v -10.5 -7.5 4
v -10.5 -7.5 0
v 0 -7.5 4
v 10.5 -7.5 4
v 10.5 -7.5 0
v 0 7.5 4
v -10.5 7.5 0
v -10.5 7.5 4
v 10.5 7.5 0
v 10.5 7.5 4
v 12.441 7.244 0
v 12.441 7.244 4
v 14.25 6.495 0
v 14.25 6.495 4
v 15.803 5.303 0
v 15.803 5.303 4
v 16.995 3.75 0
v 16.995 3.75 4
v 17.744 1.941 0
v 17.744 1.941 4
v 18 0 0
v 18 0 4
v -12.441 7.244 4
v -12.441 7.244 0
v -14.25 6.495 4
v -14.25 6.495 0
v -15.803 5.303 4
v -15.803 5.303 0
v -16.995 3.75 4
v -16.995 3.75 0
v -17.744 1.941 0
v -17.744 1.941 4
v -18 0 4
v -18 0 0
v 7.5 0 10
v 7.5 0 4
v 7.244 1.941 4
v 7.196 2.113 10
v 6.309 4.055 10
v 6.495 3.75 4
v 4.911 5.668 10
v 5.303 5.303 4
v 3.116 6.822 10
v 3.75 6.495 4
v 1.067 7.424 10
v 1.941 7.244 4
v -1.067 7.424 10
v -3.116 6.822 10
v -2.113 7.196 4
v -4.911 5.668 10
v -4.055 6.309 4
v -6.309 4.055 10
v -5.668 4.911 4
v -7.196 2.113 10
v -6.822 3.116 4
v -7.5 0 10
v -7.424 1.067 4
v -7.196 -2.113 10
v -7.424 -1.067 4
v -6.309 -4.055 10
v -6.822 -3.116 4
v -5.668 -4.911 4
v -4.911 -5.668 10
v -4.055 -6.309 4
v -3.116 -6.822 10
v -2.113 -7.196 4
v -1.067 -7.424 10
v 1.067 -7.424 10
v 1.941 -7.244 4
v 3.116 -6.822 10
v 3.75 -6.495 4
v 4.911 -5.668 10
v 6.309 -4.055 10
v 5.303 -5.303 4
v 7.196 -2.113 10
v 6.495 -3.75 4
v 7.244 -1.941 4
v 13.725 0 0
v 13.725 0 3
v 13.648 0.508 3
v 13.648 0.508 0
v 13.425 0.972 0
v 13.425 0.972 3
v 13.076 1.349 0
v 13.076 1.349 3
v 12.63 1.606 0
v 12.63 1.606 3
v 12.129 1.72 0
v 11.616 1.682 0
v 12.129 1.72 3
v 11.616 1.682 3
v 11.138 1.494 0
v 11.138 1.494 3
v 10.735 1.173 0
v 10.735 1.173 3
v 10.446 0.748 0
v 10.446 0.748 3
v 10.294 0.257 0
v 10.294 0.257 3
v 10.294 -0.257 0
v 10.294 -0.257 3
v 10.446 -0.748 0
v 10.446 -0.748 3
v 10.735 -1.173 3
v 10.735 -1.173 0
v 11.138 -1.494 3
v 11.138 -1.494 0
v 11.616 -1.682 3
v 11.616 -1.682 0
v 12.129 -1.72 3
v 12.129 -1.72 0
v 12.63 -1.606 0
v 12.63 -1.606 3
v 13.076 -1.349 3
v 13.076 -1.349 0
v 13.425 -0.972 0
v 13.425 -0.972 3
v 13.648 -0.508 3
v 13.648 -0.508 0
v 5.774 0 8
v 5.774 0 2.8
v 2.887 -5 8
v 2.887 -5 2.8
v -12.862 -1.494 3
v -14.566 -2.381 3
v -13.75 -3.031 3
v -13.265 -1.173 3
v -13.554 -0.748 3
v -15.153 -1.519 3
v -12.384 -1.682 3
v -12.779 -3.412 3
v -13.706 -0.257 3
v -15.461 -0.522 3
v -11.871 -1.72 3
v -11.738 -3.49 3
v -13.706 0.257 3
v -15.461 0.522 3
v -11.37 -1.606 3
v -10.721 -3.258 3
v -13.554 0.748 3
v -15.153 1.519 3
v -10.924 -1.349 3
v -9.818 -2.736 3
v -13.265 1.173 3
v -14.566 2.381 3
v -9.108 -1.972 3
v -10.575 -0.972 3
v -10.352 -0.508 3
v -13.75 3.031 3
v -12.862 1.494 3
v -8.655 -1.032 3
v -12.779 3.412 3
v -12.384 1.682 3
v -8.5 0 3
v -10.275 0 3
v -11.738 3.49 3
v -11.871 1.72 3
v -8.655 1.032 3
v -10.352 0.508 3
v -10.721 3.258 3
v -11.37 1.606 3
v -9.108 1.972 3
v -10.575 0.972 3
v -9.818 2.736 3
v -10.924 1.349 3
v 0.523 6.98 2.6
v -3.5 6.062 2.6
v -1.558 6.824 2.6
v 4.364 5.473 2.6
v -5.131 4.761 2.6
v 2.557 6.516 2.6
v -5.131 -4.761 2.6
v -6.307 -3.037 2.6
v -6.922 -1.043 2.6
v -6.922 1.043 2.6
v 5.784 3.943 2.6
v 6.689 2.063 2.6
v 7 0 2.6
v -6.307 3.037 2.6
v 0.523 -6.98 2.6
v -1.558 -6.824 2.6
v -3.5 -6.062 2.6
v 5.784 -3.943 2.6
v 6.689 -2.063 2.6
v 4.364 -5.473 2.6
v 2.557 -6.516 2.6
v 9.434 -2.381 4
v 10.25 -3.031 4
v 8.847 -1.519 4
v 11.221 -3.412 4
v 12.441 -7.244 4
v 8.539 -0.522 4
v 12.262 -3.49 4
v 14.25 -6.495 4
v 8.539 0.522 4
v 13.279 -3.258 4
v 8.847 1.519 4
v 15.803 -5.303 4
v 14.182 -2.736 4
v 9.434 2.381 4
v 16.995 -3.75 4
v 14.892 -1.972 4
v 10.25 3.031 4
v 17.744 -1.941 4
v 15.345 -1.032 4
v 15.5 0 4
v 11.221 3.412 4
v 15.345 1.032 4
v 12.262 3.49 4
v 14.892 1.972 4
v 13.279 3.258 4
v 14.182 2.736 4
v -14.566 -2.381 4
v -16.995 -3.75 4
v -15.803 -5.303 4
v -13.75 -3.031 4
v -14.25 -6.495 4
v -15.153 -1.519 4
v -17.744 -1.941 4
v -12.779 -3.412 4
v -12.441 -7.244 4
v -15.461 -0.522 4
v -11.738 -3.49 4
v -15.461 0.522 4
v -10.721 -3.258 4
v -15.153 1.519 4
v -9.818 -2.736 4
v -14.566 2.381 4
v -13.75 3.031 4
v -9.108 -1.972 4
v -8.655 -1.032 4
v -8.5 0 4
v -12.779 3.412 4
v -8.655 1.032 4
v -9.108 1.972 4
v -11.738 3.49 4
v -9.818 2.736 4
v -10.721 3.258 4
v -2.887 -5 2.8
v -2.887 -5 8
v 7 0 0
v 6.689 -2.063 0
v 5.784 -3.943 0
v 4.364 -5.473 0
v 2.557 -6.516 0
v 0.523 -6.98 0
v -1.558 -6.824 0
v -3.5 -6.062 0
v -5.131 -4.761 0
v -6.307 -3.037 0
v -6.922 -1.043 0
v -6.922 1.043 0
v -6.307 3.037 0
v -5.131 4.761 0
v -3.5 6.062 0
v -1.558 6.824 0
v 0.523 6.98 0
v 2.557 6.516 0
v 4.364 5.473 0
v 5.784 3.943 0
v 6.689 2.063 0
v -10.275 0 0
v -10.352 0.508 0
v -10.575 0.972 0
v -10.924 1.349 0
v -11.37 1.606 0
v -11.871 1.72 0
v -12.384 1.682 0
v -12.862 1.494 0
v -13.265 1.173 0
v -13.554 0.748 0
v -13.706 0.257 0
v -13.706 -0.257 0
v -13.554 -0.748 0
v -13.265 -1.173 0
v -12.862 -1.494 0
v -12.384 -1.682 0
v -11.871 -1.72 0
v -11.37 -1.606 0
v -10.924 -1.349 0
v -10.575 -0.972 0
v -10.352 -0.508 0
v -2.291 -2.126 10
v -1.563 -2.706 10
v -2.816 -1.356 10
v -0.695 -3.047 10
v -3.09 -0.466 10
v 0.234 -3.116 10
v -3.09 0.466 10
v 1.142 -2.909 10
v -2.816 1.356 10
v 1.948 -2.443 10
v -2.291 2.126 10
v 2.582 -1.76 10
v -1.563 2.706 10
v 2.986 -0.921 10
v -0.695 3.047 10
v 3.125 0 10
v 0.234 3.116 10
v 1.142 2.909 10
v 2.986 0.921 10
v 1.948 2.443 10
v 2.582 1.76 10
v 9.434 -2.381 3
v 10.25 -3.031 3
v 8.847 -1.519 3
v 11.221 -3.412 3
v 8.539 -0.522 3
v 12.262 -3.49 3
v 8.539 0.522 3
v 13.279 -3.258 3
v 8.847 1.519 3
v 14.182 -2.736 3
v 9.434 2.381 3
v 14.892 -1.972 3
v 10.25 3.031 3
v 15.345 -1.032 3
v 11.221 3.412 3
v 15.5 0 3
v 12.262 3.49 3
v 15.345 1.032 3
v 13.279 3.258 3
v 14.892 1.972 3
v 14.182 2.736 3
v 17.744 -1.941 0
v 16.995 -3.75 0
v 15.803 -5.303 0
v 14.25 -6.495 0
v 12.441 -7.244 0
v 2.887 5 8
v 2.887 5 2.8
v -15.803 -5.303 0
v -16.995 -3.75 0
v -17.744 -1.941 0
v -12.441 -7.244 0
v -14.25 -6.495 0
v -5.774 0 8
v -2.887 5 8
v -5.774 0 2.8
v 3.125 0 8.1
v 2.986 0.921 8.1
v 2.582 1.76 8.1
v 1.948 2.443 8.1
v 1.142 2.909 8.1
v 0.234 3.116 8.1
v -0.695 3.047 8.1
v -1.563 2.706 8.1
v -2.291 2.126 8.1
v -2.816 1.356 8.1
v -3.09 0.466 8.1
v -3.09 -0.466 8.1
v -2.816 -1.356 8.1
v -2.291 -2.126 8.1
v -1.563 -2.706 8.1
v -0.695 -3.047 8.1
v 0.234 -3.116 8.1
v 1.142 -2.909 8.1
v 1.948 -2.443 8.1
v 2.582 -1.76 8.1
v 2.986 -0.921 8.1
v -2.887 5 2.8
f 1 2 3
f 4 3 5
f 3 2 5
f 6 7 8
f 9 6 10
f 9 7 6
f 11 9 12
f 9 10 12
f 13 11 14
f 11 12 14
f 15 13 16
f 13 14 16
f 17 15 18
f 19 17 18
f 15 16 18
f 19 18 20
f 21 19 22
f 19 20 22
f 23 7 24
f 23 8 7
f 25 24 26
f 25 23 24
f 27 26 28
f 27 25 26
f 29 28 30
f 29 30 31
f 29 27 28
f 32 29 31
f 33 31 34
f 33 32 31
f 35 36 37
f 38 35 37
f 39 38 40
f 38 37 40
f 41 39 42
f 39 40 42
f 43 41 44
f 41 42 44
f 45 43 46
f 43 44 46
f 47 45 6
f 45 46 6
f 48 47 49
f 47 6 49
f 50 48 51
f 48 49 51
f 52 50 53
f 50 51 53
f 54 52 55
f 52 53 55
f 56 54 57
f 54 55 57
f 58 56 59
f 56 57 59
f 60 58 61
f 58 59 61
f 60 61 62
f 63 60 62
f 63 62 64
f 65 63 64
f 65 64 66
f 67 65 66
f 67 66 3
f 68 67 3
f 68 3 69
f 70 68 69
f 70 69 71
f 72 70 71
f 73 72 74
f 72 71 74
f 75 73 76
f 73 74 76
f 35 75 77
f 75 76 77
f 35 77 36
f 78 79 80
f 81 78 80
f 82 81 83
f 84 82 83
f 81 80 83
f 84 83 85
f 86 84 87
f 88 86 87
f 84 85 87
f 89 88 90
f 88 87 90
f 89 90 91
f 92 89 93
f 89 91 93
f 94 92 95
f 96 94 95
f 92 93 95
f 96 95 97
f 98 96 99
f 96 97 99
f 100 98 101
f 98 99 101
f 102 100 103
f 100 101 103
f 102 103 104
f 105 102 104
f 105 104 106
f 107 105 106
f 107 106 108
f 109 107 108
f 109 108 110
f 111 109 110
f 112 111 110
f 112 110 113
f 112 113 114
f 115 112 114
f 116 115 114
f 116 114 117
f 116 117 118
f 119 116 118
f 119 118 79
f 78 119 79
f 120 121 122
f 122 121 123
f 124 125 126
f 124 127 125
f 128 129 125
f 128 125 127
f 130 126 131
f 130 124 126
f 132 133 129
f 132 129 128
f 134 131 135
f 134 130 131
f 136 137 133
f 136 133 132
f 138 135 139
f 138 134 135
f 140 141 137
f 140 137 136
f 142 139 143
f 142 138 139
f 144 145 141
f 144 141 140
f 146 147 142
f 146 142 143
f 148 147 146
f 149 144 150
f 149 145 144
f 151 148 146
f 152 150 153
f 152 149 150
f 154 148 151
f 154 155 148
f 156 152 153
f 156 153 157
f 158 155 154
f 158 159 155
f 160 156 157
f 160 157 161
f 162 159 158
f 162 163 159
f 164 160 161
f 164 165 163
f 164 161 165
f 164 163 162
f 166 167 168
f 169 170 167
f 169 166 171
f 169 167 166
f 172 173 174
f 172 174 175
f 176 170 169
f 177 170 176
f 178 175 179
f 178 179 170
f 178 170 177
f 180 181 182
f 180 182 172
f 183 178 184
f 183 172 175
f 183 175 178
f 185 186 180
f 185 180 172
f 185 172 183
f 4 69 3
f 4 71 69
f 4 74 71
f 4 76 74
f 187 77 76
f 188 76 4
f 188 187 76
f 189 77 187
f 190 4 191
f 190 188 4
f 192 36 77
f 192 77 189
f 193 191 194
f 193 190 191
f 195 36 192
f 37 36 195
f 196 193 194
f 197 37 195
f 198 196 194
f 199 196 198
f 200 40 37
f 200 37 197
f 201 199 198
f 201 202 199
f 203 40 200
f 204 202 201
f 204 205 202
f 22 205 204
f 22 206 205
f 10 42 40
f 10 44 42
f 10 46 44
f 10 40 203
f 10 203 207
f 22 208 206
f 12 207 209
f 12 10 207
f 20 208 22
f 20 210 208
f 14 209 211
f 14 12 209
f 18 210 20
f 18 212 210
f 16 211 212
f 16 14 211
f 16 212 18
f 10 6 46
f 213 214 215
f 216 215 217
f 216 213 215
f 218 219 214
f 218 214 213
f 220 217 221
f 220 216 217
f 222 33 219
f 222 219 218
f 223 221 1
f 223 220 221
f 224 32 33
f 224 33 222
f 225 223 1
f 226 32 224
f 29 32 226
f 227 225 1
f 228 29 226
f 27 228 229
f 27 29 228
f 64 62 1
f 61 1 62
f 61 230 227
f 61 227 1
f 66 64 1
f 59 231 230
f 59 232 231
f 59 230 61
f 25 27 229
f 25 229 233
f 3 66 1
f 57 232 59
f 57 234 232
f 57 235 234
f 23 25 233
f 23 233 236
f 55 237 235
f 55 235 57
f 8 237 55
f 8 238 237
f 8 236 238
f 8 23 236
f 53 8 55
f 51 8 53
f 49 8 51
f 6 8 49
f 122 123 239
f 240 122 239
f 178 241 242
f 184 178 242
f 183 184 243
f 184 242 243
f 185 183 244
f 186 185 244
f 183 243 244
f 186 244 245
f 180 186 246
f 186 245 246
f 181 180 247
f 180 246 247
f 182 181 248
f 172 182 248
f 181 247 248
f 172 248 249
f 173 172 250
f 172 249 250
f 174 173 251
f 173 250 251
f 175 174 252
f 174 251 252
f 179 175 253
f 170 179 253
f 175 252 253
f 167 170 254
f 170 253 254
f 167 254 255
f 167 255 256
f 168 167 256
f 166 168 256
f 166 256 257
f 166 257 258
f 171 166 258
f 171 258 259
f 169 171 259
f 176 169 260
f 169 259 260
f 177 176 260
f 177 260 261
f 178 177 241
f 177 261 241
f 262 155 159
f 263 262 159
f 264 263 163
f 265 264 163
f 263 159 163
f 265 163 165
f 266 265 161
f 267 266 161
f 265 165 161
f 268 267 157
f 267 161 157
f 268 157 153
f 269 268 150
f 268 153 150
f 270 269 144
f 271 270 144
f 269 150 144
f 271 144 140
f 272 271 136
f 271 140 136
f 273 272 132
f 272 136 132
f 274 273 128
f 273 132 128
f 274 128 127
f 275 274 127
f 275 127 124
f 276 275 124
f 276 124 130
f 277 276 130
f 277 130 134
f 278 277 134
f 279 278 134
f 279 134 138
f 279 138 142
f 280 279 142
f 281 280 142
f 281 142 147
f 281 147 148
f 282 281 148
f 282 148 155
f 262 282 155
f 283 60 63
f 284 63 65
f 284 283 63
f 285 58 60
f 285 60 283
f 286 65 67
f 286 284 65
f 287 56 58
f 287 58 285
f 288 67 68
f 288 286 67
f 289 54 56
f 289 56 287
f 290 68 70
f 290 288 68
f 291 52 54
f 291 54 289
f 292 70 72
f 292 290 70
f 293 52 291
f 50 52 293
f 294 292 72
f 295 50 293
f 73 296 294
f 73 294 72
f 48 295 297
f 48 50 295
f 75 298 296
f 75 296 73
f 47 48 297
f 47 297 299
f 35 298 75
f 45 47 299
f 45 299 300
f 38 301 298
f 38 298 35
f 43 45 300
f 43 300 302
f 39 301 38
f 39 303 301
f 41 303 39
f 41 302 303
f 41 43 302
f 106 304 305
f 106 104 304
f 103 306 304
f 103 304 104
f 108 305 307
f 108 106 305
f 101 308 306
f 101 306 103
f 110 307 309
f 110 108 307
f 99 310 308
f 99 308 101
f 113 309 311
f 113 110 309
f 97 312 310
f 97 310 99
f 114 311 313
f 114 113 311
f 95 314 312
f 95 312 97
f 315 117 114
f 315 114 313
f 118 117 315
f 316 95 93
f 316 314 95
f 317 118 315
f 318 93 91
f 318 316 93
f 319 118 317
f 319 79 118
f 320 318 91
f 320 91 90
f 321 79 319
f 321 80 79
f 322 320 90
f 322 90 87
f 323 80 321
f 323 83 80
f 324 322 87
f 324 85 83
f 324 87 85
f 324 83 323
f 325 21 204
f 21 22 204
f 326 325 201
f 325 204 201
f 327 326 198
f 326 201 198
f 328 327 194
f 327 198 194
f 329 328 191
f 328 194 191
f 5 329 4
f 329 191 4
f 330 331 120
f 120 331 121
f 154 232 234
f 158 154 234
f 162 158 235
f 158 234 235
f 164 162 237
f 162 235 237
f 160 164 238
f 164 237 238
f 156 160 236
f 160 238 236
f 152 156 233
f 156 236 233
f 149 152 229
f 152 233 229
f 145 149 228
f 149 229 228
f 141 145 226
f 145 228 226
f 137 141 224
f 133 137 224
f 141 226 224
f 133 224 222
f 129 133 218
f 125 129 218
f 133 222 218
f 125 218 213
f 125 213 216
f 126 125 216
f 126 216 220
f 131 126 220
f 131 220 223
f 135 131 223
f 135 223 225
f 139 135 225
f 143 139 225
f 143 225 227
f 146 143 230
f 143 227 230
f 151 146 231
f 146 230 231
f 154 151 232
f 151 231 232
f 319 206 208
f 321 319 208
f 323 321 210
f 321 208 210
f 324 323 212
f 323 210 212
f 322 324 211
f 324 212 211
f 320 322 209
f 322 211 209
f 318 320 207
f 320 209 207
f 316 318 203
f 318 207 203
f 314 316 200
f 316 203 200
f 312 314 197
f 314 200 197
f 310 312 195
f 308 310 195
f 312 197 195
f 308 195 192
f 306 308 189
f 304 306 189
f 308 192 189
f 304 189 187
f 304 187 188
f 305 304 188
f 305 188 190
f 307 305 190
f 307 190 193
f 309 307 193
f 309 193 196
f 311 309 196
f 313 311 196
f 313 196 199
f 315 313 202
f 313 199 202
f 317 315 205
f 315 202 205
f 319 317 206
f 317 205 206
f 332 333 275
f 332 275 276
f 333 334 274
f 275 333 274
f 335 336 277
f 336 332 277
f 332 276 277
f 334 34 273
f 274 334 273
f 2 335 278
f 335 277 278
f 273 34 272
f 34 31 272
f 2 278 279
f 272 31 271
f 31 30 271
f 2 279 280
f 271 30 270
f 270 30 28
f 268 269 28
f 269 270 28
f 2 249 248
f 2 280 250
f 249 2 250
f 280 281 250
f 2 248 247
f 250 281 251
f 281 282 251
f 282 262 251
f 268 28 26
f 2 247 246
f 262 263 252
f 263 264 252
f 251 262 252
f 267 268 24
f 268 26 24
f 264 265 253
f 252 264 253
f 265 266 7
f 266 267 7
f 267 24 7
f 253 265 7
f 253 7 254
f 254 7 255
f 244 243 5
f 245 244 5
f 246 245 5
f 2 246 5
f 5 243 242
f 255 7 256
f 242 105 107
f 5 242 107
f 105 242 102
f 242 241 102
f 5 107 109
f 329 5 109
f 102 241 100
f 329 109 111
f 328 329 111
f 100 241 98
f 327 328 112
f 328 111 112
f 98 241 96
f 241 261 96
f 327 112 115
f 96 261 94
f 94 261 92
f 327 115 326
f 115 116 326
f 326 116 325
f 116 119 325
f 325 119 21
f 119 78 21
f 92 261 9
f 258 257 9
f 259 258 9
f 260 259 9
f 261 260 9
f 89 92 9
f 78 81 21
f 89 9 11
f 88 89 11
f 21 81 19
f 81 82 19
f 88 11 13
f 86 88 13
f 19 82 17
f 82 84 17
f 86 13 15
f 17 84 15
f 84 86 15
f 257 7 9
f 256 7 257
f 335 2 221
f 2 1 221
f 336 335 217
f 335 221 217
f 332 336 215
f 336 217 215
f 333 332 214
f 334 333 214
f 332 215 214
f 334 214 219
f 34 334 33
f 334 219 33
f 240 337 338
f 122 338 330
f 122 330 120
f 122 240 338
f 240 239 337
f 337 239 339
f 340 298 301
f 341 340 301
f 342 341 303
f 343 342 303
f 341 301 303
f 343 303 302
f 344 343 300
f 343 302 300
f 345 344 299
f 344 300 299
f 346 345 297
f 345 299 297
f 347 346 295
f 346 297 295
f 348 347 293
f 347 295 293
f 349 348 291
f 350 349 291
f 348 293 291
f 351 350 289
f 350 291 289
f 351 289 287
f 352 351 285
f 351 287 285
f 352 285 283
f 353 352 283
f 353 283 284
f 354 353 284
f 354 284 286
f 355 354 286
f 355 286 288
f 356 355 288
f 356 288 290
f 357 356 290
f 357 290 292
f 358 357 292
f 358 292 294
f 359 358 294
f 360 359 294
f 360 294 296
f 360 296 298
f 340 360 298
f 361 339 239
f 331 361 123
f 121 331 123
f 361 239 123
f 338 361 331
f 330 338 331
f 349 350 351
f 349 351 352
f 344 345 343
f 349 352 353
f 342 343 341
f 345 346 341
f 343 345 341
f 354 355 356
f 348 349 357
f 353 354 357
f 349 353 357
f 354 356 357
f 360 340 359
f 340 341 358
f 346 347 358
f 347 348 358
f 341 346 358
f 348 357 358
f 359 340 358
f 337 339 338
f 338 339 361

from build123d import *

# Parameters (mm, degrees)
F0_W      = 36
F0_H      = 15
F1_DEPTH  = 4
F2_R      = 7.5
F3_DEPTH  = 6
F4_R      = 7.49999
F6_DEPTH  = 8
F7_R      = 1.725
F8_DEPTH  = 4
F7_R_2    = 3.5
F9_DEPTH  = 1
F10_R     = 3.125
F11_DEPTH = 2
F12_R     = 3.2
F13_DEPTH = 0.1
F14_R     = 7
F15_DEPTH = 2.6
F17_DEPTH = 0.2


# Not quite as in the source:
# - a fillet or chamfer is up to 0.001 mm smaller than in the source, because OpenCascade refuses the exact size


with BuildPart() as f1:
    # F0 (on Top) → F1 (new body)
    with BuildSketch(Plane.XY):
        Rectangle(F0_W, F0_H)
    extrude(amount=F1_DEPTH)

    # F2 (on face) → F3 (join)
    with BuildSketch(Plane.XY.offset(4)):
        Circle(F2_R)
    extrude(amount=F3_DEPTH)

    # F4 (radius 7.5 in the source; OpenCascade refuses exactly that, so slightly less here)
    f4_edges = [f1.edges().sort_by_distance(p)[0] for p in [
        (-18, -7.5, 2),
        (-18, 7.5, 2),
        (18, -7.5, 2),
        (18, 7.5, 2),
    ]]
    fillet(f4_edges, radius=F4_R)

    # F5 (on face) → F6 (cut)
    with BuildSketch(Plane(origin=(0, 0, 0), x_dir=(1, 0, 0), z_dir=(0, 0, -1))):
        Polygon((2.8867513459, 5), (-2.8867513459, 5), (-5.7735026919, 0), (-2.8867513459, -5), (2.8867513459, -5), (5.7735026919, 0), align=None)
    extrude(amount=-F6_DEPTH, mode=Mode.SUBTRACT)

    # F7 (on face) → F8 (cut, through all)
    with BuildSketch(Plane.XY.offset(4)):
        with Locations((12, 0)):
            Circle(F7_R)
        with Locations((-12, 0)):
            Circle(F7_R)
    extrude(amount=-F8_DEPTH, mode=Mode.SUBTRACT)

    # F7 (on face) → F9 (cut)
    with BuildSketch(Plane.XY.offset(4)):
        with Locations((-12, 0)):
            Circle(F7_R_2)
        with Locations((-12, 0)):
            Circle(F7_R, mode=Mode.SUBTRACT)
        with Locations((12, 0)):
            Circle(F7_R_2)
        with Locations((12, 0)):
            Circle(F7_R, mode=Mode.SUBTRACT)
    extrude(amount=-F9_DEPTH, mode=Mode.SUBTRACT)

    # F10 (on face) → F11 (cut, through all)
    with BuildSketch(Plane.XY.offset(10)):
        Circle(F10_R)
    extrude(amount=-F11_DEPTH, mode=Mode.SUBTRACT)

    # F12 (on face) → F13 (join)
    with BuildSketch(Plane(origin=(0, 0, 8), x_dir=(1, 0, 0), z_dir=(0, 0, -1))):
        Circle(F12_R)
    extrude(amount=-F13_DEPTH)

    # F14 (on face) → F15 (cut)
    with BuildSketch(Plane(origin=(0, 0, 0), x_dir=(1, 0, 0), z_dir=(0, 0, -1))):
        Circle(F14_R)
    extrude(amount=-F15_DEPTH, mode=Mode.SUBTRACT)

    # F16 (on face) → F17 (join)
    with BuildSketch(Plane(origin=(0, 0, 2.6), x_dir=(1, 0, 0), z_dir=(0, 0, -1))):
        Polygon((2.8867513459, 5), (-2.8867513459, 5), (-5.7735026919, 0), (-2.8867513459, -5), (2.8867513459, -5), (5.7735026919, 0), align=None)
    extrude(amount=-F17_DEPTH)


solid = f1.part
